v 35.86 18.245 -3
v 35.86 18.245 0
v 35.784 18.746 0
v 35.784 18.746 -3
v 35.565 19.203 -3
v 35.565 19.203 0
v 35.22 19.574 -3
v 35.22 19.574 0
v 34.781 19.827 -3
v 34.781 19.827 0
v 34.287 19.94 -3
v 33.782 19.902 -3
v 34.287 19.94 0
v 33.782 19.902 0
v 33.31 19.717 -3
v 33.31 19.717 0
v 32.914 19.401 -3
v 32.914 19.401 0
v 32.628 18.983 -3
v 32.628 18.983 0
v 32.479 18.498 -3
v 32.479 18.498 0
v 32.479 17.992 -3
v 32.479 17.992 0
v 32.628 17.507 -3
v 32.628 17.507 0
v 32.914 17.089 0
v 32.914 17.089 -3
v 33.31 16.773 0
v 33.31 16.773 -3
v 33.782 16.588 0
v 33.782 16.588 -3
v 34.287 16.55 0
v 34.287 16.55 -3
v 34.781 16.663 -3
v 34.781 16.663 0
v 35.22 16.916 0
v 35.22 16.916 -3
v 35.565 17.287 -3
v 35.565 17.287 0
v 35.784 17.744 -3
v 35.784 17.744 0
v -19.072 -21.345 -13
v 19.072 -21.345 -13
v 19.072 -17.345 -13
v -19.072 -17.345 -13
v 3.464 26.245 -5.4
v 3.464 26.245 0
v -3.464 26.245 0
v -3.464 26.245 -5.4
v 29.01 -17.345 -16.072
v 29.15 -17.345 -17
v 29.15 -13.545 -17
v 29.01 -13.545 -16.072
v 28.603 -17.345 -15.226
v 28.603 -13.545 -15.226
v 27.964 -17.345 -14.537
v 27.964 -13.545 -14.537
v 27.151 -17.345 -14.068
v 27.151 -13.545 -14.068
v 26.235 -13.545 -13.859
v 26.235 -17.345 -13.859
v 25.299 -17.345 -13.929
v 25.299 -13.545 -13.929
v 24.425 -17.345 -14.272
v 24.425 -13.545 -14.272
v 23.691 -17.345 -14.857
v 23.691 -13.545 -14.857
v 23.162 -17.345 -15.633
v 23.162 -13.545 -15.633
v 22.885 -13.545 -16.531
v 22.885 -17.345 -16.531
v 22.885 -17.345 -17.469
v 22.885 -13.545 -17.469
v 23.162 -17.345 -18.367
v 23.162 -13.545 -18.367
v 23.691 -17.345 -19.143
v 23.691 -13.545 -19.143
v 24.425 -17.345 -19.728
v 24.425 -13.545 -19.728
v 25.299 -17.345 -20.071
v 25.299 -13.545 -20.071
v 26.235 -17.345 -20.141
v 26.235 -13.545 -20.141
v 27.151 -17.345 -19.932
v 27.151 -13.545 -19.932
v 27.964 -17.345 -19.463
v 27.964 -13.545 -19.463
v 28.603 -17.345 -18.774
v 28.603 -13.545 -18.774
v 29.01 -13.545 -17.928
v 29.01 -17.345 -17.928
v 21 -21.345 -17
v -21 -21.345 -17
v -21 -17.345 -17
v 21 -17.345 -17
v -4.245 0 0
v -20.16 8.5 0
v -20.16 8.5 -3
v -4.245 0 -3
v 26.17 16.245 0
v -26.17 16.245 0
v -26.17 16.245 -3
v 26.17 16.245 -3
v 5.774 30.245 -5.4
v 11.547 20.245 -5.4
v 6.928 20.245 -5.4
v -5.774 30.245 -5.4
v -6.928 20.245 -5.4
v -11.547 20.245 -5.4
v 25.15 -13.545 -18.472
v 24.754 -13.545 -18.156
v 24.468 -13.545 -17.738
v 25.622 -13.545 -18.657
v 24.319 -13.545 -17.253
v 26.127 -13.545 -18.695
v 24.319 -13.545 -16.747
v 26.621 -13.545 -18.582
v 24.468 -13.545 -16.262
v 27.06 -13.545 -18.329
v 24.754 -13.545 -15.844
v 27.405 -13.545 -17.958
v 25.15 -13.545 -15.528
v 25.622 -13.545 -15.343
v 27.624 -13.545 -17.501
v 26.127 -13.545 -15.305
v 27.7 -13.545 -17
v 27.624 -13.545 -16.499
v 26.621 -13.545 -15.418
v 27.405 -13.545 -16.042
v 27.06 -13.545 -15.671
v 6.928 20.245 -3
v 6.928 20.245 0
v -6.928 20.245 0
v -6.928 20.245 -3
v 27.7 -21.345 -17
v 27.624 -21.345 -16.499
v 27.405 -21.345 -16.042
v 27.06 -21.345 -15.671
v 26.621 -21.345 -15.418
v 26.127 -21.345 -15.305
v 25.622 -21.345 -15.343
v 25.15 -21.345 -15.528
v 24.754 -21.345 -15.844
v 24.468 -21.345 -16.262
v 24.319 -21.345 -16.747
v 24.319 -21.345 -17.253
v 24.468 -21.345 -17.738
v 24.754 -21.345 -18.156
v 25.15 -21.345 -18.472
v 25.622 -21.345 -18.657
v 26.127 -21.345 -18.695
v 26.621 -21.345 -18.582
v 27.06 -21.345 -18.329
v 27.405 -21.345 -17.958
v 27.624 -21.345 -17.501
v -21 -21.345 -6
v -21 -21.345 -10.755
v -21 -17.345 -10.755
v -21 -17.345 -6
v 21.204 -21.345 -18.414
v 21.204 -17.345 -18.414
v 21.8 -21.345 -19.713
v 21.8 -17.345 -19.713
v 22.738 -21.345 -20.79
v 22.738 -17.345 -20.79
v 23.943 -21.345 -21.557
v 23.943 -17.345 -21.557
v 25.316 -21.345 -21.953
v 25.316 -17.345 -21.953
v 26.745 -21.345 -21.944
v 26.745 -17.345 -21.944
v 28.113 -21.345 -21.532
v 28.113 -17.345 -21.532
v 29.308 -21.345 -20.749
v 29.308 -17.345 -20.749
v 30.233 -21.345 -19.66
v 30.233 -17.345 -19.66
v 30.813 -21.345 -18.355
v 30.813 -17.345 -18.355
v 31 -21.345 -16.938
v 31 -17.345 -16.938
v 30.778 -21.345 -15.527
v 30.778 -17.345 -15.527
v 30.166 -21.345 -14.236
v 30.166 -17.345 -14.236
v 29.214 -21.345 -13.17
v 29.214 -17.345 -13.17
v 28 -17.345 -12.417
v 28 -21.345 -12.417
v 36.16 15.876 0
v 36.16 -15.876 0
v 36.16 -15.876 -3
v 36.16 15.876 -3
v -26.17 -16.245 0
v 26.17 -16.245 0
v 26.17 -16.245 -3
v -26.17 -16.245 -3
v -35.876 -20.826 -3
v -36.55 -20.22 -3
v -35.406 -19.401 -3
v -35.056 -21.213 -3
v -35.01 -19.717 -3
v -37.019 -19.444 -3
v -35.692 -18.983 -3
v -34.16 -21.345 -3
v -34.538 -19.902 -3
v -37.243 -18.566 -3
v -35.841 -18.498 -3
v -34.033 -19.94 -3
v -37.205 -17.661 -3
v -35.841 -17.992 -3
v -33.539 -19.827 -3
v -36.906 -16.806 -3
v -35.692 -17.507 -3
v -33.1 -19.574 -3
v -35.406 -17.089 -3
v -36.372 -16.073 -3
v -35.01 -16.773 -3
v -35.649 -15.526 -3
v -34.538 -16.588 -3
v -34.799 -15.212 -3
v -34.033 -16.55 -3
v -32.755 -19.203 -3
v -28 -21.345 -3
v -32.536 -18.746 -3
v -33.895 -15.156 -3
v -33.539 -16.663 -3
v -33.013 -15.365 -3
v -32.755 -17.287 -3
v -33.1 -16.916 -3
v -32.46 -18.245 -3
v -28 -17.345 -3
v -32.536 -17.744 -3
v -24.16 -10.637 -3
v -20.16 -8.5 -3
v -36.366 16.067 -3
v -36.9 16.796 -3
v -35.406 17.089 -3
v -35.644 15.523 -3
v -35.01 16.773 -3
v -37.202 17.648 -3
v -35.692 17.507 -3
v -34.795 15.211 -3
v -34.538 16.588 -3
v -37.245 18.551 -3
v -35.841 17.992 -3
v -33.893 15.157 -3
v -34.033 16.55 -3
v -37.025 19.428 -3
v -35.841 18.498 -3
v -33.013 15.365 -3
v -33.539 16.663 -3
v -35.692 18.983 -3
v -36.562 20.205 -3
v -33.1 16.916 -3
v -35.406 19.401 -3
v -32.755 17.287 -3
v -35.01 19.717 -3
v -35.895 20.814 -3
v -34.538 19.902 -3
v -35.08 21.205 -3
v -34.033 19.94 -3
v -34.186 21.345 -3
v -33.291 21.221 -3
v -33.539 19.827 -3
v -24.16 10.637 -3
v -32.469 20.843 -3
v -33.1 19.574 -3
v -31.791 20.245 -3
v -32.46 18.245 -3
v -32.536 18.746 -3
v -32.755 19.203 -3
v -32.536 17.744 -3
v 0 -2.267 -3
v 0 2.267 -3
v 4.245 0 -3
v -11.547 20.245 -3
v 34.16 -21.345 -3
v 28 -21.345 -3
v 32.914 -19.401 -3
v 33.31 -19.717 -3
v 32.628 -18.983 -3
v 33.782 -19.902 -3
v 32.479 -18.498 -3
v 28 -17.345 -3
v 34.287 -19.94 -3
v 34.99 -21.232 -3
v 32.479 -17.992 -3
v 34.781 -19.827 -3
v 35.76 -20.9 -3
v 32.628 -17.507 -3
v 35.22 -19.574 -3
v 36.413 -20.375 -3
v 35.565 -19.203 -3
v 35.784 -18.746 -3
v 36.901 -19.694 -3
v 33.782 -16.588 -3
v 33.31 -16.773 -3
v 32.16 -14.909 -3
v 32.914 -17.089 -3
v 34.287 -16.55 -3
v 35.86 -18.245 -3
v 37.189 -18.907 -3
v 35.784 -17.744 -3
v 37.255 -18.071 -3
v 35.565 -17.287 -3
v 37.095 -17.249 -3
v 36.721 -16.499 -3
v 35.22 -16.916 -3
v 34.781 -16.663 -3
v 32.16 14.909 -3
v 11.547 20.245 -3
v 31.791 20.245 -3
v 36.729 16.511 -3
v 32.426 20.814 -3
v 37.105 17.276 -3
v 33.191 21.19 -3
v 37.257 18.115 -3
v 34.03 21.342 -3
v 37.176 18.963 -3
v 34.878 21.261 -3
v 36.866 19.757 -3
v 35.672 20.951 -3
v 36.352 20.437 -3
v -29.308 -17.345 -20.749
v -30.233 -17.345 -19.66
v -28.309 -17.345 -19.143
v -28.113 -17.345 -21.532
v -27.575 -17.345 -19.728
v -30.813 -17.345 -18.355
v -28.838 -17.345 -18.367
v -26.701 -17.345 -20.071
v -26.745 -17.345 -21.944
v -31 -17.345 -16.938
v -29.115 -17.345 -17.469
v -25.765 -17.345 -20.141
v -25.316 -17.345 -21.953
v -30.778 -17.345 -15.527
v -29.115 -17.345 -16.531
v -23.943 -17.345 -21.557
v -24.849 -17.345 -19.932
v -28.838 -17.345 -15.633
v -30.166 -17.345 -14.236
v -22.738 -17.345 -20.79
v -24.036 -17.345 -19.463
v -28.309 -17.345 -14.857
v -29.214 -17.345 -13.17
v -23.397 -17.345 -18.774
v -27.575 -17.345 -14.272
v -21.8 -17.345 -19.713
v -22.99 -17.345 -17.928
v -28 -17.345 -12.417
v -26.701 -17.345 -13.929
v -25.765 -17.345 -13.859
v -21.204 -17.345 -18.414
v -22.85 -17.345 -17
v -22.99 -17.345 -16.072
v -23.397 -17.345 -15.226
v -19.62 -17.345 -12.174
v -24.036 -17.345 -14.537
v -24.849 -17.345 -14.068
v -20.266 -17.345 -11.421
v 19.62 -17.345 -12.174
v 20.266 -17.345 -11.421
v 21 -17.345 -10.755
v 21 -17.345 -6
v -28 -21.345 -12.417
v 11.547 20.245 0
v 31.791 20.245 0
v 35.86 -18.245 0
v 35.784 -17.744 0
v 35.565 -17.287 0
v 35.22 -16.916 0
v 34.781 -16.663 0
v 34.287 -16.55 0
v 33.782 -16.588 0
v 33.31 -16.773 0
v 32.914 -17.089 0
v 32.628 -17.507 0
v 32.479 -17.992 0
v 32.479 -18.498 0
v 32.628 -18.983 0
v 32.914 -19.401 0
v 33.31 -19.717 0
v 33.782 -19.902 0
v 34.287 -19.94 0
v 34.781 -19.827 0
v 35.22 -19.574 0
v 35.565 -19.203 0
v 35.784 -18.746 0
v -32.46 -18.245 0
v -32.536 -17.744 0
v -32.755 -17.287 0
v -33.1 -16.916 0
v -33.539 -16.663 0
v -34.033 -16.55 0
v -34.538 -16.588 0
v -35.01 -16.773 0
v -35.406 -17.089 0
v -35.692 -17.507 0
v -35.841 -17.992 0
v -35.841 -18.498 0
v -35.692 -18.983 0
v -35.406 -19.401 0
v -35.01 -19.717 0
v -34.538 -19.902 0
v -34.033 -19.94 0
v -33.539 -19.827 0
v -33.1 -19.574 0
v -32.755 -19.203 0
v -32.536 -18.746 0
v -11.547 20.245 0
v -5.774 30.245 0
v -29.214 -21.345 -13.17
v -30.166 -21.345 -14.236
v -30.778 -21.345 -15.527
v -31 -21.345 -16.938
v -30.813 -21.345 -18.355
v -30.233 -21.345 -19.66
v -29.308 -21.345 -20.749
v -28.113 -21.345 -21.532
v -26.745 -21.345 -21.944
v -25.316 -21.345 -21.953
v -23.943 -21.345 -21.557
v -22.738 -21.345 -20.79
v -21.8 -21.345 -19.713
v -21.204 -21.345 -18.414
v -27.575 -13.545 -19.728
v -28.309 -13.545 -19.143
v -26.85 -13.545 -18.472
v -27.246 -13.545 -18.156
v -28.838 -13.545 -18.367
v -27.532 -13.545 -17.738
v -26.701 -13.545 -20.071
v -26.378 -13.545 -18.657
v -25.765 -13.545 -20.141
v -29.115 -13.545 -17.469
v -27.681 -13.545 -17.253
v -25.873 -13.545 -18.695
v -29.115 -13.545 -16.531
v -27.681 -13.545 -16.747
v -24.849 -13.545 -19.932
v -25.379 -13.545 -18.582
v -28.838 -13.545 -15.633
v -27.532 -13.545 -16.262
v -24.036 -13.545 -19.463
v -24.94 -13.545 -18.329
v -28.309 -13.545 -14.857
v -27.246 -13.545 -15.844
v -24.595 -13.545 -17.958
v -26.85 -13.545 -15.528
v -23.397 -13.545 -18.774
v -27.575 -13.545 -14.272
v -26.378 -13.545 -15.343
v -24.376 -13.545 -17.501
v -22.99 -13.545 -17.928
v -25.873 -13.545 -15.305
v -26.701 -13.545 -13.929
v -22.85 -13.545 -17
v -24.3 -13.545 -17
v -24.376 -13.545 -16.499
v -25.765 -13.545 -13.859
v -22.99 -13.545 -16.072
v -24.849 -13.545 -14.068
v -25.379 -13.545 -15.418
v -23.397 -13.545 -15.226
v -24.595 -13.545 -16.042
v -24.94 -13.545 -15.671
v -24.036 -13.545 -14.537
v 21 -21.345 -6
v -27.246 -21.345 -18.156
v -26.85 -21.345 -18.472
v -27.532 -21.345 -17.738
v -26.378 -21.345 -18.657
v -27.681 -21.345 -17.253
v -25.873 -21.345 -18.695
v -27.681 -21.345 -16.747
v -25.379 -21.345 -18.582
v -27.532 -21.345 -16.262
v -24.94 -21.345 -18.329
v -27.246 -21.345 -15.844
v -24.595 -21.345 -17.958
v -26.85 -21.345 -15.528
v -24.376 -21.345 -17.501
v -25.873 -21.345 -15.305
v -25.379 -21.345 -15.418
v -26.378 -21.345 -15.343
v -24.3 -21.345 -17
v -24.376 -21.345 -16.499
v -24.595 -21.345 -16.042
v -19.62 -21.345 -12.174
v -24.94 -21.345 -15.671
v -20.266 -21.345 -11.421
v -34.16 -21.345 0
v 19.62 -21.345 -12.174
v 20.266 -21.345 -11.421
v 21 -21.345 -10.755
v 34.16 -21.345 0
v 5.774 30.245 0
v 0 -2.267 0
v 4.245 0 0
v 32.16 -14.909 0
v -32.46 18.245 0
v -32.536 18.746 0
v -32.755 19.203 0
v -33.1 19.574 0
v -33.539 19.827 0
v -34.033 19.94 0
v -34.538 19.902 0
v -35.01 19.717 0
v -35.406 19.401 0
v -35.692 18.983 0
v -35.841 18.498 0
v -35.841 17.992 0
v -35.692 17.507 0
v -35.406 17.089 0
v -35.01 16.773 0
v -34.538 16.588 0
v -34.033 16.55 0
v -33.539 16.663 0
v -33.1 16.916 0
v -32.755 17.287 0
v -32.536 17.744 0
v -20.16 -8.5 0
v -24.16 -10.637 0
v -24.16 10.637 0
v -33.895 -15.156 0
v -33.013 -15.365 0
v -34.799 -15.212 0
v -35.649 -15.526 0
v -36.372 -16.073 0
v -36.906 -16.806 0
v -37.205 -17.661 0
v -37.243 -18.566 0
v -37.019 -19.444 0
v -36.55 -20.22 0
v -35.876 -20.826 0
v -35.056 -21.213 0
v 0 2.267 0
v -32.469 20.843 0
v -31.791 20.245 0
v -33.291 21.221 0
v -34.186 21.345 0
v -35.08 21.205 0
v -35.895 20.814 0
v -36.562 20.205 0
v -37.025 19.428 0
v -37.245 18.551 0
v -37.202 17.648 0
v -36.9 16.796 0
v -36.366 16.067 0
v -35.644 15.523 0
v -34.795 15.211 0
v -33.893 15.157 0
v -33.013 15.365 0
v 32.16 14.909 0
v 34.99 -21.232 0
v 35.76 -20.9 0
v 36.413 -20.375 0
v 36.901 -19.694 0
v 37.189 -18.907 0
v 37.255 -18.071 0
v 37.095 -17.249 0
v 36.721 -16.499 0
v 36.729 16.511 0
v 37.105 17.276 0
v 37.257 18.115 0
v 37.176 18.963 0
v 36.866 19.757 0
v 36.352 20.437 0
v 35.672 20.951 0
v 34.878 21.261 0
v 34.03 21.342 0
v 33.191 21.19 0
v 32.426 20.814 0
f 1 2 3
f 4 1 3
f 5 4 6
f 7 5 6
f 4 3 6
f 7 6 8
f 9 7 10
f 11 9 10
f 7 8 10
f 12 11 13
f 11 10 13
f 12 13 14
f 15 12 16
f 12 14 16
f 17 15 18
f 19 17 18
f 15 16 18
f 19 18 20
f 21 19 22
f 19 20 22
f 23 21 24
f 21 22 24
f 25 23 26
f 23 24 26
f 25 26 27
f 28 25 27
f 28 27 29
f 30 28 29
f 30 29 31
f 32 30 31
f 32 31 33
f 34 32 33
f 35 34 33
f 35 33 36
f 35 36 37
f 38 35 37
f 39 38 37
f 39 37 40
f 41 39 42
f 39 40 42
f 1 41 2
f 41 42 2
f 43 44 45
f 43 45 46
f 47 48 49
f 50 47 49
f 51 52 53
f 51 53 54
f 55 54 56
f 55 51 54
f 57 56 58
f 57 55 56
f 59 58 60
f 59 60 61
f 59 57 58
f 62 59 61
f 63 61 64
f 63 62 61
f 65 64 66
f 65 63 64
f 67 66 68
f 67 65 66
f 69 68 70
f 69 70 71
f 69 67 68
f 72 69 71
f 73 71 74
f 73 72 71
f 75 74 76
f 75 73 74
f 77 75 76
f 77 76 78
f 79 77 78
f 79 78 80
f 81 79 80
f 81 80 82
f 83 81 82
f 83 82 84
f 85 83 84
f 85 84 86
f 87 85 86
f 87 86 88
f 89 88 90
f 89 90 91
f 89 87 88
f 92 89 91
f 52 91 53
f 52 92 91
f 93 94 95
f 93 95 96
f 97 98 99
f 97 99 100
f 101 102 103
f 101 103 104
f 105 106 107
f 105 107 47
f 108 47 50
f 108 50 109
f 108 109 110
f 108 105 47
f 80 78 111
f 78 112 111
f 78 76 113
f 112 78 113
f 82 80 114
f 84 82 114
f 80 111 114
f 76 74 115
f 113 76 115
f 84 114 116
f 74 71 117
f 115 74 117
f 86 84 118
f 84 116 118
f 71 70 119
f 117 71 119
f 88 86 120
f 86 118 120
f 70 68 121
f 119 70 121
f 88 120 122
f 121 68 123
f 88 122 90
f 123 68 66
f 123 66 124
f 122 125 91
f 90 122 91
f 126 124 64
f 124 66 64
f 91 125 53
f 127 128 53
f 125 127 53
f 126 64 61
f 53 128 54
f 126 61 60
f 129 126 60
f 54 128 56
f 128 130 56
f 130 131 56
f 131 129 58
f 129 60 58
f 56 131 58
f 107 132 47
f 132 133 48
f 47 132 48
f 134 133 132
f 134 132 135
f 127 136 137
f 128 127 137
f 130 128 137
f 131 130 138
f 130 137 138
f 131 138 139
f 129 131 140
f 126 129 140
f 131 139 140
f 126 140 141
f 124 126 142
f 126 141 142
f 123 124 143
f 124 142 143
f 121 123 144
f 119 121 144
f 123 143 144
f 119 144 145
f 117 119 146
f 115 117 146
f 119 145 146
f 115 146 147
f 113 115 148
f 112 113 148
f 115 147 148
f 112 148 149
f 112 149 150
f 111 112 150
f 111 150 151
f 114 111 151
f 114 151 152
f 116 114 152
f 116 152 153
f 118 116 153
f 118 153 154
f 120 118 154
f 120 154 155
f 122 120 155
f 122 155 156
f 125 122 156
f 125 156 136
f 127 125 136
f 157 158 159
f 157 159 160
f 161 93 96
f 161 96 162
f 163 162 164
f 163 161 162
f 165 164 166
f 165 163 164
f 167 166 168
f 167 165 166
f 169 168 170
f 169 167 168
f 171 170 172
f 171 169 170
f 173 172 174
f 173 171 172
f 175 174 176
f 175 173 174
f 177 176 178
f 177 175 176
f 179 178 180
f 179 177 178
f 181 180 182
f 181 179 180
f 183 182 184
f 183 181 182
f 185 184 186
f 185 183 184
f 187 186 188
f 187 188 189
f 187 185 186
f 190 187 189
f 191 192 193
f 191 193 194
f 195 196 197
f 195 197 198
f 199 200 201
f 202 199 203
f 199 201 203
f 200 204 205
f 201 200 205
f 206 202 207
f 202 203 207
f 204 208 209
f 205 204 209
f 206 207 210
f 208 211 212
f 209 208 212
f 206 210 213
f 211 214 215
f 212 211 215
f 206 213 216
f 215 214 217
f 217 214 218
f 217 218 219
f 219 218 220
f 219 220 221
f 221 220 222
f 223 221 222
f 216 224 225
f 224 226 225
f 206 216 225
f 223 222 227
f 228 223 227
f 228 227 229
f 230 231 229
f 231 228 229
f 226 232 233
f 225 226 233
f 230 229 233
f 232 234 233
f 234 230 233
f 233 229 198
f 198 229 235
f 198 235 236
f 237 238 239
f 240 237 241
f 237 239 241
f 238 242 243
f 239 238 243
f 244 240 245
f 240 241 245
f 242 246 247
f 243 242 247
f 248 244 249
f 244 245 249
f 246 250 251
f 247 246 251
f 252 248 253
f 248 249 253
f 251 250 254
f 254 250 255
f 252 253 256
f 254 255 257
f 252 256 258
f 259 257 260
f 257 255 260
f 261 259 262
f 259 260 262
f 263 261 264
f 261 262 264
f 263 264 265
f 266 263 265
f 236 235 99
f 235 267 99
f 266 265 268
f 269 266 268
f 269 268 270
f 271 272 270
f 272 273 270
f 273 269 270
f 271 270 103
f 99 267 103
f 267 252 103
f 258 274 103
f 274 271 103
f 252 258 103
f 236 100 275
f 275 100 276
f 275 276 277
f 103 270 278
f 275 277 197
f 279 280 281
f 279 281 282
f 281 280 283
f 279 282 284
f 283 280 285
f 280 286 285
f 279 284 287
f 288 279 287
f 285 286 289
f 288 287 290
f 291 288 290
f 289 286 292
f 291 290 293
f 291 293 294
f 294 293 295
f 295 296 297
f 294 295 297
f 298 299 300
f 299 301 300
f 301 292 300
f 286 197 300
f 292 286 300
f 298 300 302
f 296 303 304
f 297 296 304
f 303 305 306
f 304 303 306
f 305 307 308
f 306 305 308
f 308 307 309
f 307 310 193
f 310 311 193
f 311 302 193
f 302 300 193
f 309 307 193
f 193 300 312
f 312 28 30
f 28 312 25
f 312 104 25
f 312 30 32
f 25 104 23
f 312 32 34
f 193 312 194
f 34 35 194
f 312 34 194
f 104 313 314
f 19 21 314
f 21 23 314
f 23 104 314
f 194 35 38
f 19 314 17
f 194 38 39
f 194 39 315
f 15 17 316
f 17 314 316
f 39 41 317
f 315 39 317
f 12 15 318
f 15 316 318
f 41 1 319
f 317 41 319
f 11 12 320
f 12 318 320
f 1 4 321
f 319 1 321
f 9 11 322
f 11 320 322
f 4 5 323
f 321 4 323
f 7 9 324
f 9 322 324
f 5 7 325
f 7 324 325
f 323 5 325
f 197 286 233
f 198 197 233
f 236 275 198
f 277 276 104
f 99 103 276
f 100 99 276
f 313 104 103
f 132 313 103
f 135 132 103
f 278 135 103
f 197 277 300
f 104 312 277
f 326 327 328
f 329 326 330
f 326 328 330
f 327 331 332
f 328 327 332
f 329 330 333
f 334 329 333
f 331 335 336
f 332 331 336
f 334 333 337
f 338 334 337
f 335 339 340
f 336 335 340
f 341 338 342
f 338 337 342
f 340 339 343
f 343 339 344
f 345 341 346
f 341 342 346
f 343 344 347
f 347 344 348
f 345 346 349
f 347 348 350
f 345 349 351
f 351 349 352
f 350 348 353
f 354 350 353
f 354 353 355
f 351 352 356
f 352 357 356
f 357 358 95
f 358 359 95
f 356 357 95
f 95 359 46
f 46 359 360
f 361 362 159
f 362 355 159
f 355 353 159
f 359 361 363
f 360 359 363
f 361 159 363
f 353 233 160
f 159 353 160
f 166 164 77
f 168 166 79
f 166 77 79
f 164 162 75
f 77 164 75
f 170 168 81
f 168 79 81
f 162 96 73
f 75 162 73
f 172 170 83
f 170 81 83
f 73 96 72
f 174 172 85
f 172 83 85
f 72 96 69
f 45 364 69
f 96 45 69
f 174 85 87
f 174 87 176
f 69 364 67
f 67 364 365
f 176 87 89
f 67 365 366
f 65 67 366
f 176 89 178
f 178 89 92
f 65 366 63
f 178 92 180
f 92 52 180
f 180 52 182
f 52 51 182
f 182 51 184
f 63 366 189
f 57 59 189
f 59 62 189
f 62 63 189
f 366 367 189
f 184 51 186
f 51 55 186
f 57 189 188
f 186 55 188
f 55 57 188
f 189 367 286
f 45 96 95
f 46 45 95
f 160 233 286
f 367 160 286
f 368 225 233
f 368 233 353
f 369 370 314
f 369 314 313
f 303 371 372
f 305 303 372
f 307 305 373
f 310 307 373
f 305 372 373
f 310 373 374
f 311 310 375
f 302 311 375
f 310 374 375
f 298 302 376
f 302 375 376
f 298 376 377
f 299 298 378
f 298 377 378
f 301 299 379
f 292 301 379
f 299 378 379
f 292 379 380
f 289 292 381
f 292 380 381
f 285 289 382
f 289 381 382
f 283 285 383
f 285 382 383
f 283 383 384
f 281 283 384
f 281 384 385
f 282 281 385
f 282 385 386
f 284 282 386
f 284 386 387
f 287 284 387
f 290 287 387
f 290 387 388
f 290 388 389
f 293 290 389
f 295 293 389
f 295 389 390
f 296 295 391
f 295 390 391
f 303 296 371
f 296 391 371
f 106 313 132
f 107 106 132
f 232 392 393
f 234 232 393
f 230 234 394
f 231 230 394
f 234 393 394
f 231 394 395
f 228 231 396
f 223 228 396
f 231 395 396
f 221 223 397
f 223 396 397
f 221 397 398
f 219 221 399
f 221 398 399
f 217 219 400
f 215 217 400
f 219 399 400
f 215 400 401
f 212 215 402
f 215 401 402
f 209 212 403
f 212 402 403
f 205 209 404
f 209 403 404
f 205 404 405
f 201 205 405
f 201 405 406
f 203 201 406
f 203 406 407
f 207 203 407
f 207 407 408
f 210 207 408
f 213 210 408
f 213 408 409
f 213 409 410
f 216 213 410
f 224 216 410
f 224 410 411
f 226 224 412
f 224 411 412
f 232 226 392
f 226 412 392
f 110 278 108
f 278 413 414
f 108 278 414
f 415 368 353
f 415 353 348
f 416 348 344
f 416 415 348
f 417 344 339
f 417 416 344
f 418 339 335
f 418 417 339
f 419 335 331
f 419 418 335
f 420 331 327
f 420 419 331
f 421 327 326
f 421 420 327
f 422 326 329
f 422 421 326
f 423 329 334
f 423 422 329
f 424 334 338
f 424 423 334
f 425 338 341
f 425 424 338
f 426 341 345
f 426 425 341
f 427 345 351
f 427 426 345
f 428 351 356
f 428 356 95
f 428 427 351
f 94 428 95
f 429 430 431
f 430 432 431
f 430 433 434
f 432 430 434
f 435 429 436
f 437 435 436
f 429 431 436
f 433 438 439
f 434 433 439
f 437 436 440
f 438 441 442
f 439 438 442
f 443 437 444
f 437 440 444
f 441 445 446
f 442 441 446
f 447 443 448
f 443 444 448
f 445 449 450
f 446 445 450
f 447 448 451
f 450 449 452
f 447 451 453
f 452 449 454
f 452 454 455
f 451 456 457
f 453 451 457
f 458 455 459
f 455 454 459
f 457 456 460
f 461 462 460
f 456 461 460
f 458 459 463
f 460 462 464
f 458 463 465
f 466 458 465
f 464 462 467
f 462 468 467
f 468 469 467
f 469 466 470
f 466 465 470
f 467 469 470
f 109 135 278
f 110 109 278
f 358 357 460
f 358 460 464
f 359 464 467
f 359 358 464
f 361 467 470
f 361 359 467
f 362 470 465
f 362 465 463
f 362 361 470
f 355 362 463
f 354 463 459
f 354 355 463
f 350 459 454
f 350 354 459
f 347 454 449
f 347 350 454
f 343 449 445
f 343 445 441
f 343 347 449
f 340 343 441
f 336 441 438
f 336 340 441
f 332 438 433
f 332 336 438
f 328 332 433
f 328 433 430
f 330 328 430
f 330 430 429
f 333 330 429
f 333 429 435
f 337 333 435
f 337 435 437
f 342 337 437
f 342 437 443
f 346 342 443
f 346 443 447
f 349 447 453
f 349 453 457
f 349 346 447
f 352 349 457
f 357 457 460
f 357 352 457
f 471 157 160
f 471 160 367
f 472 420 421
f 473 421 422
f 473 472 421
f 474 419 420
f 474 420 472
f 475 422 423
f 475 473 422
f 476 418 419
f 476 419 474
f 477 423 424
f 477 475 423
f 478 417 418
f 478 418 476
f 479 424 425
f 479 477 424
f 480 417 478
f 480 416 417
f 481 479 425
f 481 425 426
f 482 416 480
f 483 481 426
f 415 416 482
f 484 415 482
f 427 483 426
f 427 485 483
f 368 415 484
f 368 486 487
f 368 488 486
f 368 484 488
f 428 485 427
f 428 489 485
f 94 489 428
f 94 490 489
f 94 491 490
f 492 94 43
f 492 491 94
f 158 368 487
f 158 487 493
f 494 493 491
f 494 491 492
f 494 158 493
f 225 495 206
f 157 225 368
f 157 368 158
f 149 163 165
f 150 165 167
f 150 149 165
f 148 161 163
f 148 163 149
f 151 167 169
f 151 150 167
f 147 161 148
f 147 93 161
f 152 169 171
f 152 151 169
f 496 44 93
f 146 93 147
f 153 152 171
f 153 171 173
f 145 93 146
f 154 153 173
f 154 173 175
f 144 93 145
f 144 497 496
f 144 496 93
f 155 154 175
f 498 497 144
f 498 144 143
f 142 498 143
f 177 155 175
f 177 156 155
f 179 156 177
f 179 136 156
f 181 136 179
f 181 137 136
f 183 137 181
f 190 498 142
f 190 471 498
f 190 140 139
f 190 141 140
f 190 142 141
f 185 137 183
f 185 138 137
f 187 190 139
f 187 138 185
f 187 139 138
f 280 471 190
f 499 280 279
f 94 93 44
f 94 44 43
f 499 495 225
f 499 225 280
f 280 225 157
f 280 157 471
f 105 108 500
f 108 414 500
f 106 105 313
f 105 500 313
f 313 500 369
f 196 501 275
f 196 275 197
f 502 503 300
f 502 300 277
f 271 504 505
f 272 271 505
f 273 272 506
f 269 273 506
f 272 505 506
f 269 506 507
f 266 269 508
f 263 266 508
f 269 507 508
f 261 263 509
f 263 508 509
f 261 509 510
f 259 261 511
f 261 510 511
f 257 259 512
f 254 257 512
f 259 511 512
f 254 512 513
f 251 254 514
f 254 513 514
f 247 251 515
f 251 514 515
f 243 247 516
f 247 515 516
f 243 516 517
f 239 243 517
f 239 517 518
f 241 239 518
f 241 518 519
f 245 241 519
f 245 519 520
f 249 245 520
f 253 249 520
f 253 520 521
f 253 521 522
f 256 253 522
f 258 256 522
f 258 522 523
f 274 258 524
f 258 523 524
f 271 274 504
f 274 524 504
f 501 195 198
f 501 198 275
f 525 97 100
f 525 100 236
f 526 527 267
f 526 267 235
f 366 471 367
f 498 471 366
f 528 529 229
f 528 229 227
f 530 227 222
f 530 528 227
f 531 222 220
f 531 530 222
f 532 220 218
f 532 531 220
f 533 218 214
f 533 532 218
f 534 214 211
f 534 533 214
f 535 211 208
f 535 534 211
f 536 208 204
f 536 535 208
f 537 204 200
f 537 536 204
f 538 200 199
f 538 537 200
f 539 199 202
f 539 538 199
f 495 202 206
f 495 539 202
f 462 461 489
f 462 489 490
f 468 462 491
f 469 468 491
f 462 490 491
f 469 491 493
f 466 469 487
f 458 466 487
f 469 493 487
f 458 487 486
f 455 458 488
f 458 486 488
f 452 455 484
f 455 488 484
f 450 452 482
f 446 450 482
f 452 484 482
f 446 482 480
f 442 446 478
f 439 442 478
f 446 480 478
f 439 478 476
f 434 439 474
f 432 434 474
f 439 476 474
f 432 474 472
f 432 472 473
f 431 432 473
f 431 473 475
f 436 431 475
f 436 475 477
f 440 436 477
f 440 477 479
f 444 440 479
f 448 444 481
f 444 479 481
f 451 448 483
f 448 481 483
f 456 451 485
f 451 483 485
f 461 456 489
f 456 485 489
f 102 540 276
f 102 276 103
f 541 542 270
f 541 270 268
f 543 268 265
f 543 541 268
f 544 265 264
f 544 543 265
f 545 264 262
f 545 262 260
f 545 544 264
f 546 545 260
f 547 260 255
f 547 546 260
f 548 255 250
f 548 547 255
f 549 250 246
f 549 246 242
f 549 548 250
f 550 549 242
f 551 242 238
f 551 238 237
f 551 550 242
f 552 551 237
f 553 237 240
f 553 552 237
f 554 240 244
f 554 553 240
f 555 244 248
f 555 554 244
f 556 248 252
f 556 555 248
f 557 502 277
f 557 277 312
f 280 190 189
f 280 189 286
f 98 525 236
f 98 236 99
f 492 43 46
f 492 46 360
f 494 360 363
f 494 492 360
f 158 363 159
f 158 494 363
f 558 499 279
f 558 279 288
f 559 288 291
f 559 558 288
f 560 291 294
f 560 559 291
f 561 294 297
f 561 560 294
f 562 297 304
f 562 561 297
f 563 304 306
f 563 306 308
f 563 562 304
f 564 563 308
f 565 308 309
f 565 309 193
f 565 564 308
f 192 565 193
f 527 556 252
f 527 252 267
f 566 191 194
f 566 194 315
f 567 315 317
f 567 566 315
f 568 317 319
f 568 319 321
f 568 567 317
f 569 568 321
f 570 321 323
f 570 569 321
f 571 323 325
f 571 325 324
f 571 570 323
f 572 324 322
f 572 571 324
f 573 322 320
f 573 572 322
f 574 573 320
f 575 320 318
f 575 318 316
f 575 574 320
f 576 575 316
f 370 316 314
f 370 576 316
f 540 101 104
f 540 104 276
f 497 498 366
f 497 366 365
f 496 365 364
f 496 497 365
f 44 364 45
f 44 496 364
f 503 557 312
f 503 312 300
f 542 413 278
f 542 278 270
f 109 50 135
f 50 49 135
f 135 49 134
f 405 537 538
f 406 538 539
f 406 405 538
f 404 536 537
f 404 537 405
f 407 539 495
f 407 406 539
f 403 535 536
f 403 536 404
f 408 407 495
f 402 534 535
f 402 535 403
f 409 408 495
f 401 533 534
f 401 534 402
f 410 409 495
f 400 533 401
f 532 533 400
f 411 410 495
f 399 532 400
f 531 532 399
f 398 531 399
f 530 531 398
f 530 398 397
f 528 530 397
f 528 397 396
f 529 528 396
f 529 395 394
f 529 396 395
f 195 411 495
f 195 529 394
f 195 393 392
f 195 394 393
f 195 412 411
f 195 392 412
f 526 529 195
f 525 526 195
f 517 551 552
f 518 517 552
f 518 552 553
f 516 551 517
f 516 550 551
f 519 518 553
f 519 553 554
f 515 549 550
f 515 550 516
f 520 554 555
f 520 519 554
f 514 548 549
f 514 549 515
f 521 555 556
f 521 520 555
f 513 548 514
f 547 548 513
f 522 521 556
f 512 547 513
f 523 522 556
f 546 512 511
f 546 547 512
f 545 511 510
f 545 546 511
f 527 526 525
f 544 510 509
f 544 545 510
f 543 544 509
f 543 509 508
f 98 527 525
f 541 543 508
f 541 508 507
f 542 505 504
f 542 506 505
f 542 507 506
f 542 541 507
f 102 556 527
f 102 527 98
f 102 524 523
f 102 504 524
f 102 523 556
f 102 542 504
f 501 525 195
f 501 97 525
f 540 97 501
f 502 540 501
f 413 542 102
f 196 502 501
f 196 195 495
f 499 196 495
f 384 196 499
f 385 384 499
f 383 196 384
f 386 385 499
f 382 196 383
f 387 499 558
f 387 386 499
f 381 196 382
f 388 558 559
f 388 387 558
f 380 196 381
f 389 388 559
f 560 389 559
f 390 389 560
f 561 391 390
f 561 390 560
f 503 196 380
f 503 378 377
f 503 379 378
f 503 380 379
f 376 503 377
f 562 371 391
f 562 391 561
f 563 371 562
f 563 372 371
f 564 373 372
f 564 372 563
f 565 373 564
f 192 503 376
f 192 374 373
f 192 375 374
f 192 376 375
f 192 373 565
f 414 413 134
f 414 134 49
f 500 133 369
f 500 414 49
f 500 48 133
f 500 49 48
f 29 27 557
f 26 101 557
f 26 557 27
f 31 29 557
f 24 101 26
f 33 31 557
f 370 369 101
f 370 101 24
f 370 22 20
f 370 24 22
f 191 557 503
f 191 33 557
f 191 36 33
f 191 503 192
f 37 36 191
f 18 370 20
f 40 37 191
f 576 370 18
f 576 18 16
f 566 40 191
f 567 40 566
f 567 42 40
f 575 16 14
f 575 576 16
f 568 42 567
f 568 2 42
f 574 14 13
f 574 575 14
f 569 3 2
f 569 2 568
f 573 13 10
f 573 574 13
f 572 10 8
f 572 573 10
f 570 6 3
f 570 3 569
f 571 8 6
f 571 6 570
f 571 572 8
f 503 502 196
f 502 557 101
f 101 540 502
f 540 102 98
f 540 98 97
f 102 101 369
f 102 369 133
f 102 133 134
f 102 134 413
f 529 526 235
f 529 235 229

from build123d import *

# Parameters (mm, degrees)
SKETCH1_R           = 1.7
BOSS_EXTRUDE1_DEPTH = 3
SKETCH2_R           = 1.7
BOSS_EXTRUDE2_DEPTH = 4
BOSS_EXTRUDE3_START = -4
SKETCH2_3_R         = 3.15
SKETCH2_3_R_2       = 1.7
BOSS_EXTRUDE3_DEPTH = 3.8
BOSS_EXTRUDE4_DEPTH = 2.4


with BuildPart() as part:
    # Sketch1 → Boss-Extrude1 (new body)
    with BuildSketch(Plane.XY):
        with BuildLine():
            Line((-33.013012558, 15.364996561), (-24.16, 10.636565235))
            Line((-24.16, 10.636565235), (-24.16, -10.636565235))
            Line((-24.16, -10.636565235), (-33.013012558, -15.364996561))
            ThreePointArc((-33.013012558, -15.364996561), (-37.204504119, -17.661052511), (-34.16, -21.345))
            Line((-34.16, -21.345), (34.16, -21.345))
            ThreePointArc((34.16, -21.345), (37.071398801, -19.30978027), (36.16, -15.876456144))
            Line((36.16, -15.876456144), (36.16, 15.876456144))
            ThreePointArc((36.16, 15.876456144), (36.352031022, 20.437031022), (31.791456144, 20.245))
            Line((31.791456144, 20.245), (11.547005384, 20.245))
            Line((11.547005384, 20.245), (5.773502692, 30.245))
            Line((5.773502692, 30.245), (-5.773502692, 30.245))
            Line((-5.773502692, 30.245), (-11.547005384, 20.245))
            Line((-11.547005384, 20.245), (-31.791456144, 20.245))
            ThreePointArc((-31.791456144, 20.245), (-37.167216066, 18.9977626), (-33.013012558, 15.364996561))
        make_face()
        Polygon((32.16, -14.909398958), (4.24522508, 0), (32.16, 14.909398958), align=None, mode=Mode.SUBTRACT)
        Polygon((6.92820323, 20.245), (-6.92820323, 20.245), (-3.464101615, 26.245), (3.464101615, 26.245), align=None, mode=Mode.SUBTRACT)
        Polygon((-4.24522508, 0), (-20.16, -8.500148373), (-20.16, 8.500148373), align=None, mode=Mode.SUBTRACT)
        Polygon((26.170187362, -16.245), (-26.170187362, -16.245), (0, -2.267392611), align=None, mode=Mode.SUBTRACT)
        Polygon((0, 2.267392611), (-26.170187362, 16.245), (26.170187362, 16.245), align=None, mode=Mode.SUBTRACT)
        with Locations((-34.16, 18.245)):
            Circle(SKETCH1_R, mode=Mode.SUBTRACT)
        with Locations((-34.16, -18.245)):
            Circle(SKETCH1_R, mode=Mode.SUBTRACT)
        with Locations((34.16, -18.245)):
            Circle(SKETCH1_R, mode=Mode.SUBTRACT)
        with Locations((34.16, 18.245)):
            Circle(SKETCH1_R, mode=Mode.SUBTRACT)
    extrude(amount=-BOSS_EXTRUDE1_DEPTH)

    # Sketch2 → Boss-Extrude2 (add)
    with BuildSketch(Plane.XZ.offset(21.345)):
        with BuildLine():
            Line((-28, -3), (-28, -12.417424305))
            ThreePointArc((-28, -12.417424305), (-28.738612788, -21.183300133), (-21, -17))
            Line((-21, -17), (21, -17))
            ThreePointArc((21, -17), (28.738612788, -21.183300133), (28, -12.417424305))
            Line((28, -12.417424305), (28, -3))
            Line((28, -3), (-28, -3))
        make_face()
        with BuildLine():
            Line((19.07179677, -13), (-19.07179677, -13))
            ThreePointArc((-19.07179677, -13), (-19.931185282, -11.787564109), (-21, -10.755002002))
            Line((-21, -10.755002002), (-21, -6))
            Line((-21, -6), (21, -6))
            Line((21, -6), (21, -10.755002002))
            ThreePointArc((21, -10.755002002), (19.931185282, -11.787564109), (19.07179677, -13))
        make_face(mode=Mode.SUBTRACT)
        with Locations((-26, -17)):
            Circle(SKETCH2_R, mode=Mode.SUBTRACT)
        with Locations((26, -17)):
            Circle(SKETCH2_R, mode=Mode.SUBTRACT)
    extrude(amount=-BOSS_EXTRUDE2_DEPTH)

    # Sketch2<3> → Boss-Extrude3 (add)
    with BuildSketch(Plane.XZ.offset(21.345).offset(BOSS_EXTRUDE3_START)):
        with Locations((-26, -17)):
            Circle(SKETCH2_3_R)
        with Locations((-26, -17)):
            Circle(SKETCH2_3_R_2, mode=Mode.SUBTRACT)
        with Locations((26, -17)):
            Circle(SKETCH2_3_R)
        with Locations((26, -17)):
            Circle(SKETCH2_3_R_2, mode=Mode.SUBTRACT)
    extrude(amount=-BOSS_EXTRUDE3_DEPTH)

    # Sketch3 → Boss-Extrude4 (add)
    with BuildSketch(Plane(origin=(0, 0, -3), x_dir=(-1, 0, 0), z_dir=(0, 0, -1))):
        Polygon((-3.464101615, 26.245), (3.464101615, 26.245), (6.92820323, 20.245), (11.547005384, 20.245), (5.773502692, 30.245), (-5.773502692, 30.245), (-11.547005384, 20.245), (-6.92820323, 20.245), align=None)
    extrude(amount=BOSS_EXTRUDE4_DEPTH)


solid = part.part
